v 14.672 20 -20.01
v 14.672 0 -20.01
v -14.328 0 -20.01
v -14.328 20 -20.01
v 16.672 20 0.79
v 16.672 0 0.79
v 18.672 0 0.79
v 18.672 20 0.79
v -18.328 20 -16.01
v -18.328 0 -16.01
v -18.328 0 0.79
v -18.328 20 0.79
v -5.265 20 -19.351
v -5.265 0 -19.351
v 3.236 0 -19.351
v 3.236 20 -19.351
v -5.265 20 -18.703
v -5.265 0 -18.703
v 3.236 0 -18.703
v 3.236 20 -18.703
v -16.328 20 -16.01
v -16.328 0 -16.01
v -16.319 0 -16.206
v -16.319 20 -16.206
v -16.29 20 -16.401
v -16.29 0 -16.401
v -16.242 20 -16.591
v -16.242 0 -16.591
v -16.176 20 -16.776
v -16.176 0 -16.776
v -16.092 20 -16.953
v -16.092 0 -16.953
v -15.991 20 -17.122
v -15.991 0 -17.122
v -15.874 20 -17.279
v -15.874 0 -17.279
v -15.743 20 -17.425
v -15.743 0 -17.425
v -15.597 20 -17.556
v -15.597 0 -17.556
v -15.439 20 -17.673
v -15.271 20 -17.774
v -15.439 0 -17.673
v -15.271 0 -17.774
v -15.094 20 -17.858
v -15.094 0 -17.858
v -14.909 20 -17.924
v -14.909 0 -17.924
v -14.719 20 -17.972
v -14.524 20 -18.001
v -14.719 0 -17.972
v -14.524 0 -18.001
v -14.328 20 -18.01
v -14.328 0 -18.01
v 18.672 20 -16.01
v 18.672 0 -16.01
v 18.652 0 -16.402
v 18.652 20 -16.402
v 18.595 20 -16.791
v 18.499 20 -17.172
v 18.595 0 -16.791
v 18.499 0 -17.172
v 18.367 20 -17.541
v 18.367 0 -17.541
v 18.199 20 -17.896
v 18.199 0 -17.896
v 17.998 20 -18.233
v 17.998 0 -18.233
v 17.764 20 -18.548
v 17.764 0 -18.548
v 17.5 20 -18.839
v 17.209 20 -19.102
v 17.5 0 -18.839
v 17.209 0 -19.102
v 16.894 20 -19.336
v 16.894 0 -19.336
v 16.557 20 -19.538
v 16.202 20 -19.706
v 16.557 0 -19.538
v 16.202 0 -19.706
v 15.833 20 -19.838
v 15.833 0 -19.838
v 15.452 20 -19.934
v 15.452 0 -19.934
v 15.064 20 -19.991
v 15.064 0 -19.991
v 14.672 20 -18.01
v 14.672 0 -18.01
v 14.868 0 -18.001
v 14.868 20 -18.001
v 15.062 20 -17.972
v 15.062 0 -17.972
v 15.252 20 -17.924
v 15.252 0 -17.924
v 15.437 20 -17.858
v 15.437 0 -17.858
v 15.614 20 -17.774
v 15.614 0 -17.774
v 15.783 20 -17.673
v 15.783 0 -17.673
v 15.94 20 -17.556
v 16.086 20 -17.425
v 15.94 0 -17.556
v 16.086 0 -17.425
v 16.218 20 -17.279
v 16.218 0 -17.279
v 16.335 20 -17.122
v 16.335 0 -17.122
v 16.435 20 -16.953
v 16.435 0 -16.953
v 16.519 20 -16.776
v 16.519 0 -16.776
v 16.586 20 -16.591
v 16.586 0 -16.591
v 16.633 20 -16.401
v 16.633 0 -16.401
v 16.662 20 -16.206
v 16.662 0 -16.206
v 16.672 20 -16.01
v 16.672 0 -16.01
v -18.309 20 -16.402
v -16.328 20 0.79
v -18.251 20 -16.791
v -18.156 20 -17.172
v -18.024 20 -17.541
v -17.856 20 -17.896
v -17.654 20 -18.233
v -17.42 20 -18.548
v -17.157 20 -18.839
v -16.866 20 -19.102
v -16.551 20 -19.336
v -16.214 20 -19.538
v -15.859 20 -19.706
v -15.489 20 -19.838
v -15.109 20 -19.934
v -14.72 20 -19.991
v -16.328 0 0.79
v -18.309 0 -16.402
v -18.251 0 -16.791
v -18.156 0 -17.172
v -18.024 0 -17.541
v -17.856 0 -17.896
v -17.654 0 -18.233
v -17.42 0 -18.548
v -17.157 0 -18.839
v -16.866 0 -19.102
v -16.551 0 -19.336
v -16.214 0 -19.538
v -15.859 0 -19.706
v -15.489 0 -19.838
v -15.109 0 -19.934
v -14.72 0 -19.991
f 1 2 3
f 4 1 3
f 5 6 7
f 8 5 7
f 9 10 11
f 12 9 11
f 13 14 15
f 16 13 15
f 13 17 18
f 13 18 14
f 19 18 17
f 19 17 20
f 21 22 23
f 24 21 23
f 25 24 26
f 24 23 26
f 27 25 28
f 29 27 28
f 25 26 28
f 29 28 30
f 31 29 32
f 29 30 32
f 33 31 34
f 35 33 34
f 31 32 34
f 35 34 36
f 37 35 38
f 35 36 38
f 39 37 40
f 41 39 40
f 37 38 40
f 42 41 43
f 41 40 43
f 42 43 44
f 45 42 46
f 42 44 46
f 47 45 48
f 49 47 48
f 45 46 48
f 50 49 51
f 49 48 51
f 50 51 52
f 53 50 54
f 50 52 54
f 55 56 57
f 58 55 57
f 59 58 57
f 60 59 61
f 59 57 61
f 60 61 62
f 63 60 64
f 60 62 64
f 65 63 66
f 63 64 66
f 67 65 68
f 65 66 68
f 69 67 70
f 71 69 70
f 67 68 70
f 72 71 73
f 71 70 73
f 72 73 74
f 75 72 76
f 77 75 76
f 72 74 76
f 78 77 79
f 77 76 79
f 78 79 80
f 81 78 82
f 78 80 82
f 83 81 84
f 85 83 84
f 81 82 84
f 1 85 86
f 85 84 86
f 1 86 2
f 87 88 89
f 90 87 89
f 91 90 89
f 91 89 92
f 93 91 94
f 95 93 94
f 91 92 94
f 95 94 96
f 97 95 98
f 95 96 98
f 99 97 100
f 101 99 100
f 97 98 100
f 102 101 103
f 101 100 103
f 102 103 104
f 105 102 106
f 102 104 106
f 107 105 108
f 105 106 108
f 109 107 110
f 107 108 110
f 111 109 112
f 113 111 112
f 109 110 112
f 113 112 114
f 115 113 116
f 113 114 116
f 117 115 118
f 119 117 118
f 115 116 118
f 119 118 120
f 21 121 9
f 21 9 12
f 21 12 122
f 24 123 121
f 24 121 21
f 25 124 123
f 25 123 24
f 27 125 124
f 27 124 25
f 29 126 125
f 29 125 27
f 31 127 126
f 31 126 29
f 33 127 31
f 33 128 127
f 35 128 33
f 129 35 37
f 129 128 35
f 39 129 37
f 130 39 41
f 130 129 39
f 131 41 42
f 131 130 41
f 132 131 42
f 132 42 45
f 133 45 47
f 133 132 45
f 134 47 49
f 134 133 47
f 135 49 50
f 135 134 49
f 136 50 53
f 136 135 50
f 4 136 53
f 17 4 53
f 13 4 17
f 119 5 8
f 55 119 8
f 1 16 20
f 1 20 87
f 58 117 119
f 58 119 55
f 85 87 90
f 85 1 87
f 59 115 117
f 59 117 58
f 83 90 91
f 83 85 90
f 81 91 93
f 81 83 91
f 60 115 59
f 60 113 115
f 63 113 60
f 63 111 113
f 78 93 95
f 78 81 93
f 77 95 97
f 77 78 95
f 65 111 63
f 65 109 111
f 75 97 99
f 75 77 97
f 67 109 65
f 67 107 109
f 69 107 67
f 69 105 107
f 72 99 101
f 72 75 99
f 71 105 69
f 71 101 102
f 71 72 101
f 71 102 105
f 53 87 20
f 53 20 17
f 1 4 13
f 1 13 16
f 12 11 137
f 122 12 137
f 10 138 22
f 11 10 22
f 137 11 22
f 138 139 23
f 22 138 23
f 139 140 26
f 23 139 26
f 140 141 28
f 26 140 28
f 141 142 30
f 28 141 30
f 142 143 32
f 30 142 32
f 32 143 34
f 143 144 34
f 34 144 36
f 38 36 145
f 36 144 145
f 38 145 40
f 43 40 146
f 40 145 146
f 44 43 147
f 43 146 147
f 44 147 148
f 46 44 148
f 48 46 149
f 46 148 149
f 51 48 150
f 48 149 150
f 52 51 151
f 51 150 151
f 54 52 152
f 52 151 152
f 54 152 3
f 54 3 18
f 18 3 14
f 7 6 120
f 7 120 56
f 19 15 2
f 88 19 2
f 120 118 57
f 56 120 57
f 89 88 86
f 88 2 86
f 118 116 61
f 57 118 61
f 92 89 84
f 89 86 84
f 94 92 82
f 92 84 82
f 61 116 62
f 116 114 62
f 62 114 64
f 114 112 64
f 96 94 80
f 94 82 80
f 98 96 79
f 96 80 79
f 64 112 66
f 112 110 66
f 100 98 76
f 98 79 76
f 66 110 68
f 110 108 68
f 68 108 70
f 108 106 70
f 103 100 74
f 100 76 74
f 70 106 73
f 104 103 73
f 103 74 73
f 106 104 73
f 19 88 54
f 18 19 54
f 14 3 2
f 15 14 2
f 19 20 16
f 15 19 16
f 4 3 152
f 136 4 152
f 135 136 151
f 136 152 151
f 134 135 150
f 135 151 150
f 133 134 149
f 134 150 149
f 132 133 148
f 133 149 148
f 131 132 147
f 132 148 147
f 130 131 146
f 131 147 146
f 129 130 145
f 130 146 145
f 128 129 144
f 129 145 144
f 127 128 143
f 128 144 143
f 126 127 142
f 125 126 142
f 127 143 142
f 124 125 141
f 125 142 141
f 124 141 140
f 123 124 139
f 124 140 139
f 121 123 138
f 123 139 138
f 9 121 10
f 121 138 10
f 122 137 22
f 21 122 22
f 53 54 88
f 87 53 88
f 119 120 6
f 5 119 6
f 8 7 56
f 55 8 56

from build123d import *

# Parameters (mm, degrees)
SKETCH1_W           = 8.501053498
SKETCH1_H           = 0.647699314
BOSS_EXTRUDE2_DEPTH = 20


with BuildPart() as part:
    # Sketch1 → Boss-Extrude2 (new body)
    with BuildSketch(Plane(origin=(0, 0, 0), x_dir=(1, 0, 0), z_dir=(0, 1, 0))):
        with BuildLine():
            Line((-16.328355949, -0.789632586), (-16.328355949, 9.010367414))
            Line((-16.328355949, 9.010367414), (-16.328355949, 16.010367414))
            ThreePointArc((-16.328355949, 16.010367414), (-15.742569512, 17.424580976), (-14.328355949, 18.010367414))
            Line((-14.328355949, 18.010367414), (14.671644051, 18.010367414))
            ThreePointArc((14.671644051, 18.010367414), (16.085857613, 17.424580976), (16.671644051, 16.010367414))
            Line((16.671644051, 16.010367414), (16.671644051, 9.010367414))
            Line((16.671644051, 9.010367414), (16.671644051, -0.789632586))
            Line((16.671644051, -0.789632586), (18.671644051, -0.789632586))
            Line((18.671644051, -0.789632586), (18.671644051, 9.010367414))
            Line((18.671644051, 9.010367414), (18.671644051, 16.010367414))
            ThreePointArc((18.671644051, 16.010367414), (17.500071175, 18.838794538), (14.671644051, 20.010367414))
            Line((14.671644051, 20.010367414), (-14.328355949, 20.010367414))
            ThreePointArc((-14.328355949, 20.010367414), (-17.156783074, 18.838794538), (-18.328355949, 16.010367414))
            Line((-18.328355949, 16.010367414), (-18.328355949, 9.010367414))
            Line((-18.328355949, 9.010367414), (-18.328355949, -0.789632586))
            Line((-18.328355949, -0.789632586), (-16.328355949, -0.789632586))
        make_face()
        with Locations((-1.014089745, 19.027186225)):
            Rectangle(SKETCH1_W, SKETCH1_H, mode=Mode.SUBTRACT)
    extrude(amount=BOSS_EXTRUDE2_DEPTH)


solid = part.part
